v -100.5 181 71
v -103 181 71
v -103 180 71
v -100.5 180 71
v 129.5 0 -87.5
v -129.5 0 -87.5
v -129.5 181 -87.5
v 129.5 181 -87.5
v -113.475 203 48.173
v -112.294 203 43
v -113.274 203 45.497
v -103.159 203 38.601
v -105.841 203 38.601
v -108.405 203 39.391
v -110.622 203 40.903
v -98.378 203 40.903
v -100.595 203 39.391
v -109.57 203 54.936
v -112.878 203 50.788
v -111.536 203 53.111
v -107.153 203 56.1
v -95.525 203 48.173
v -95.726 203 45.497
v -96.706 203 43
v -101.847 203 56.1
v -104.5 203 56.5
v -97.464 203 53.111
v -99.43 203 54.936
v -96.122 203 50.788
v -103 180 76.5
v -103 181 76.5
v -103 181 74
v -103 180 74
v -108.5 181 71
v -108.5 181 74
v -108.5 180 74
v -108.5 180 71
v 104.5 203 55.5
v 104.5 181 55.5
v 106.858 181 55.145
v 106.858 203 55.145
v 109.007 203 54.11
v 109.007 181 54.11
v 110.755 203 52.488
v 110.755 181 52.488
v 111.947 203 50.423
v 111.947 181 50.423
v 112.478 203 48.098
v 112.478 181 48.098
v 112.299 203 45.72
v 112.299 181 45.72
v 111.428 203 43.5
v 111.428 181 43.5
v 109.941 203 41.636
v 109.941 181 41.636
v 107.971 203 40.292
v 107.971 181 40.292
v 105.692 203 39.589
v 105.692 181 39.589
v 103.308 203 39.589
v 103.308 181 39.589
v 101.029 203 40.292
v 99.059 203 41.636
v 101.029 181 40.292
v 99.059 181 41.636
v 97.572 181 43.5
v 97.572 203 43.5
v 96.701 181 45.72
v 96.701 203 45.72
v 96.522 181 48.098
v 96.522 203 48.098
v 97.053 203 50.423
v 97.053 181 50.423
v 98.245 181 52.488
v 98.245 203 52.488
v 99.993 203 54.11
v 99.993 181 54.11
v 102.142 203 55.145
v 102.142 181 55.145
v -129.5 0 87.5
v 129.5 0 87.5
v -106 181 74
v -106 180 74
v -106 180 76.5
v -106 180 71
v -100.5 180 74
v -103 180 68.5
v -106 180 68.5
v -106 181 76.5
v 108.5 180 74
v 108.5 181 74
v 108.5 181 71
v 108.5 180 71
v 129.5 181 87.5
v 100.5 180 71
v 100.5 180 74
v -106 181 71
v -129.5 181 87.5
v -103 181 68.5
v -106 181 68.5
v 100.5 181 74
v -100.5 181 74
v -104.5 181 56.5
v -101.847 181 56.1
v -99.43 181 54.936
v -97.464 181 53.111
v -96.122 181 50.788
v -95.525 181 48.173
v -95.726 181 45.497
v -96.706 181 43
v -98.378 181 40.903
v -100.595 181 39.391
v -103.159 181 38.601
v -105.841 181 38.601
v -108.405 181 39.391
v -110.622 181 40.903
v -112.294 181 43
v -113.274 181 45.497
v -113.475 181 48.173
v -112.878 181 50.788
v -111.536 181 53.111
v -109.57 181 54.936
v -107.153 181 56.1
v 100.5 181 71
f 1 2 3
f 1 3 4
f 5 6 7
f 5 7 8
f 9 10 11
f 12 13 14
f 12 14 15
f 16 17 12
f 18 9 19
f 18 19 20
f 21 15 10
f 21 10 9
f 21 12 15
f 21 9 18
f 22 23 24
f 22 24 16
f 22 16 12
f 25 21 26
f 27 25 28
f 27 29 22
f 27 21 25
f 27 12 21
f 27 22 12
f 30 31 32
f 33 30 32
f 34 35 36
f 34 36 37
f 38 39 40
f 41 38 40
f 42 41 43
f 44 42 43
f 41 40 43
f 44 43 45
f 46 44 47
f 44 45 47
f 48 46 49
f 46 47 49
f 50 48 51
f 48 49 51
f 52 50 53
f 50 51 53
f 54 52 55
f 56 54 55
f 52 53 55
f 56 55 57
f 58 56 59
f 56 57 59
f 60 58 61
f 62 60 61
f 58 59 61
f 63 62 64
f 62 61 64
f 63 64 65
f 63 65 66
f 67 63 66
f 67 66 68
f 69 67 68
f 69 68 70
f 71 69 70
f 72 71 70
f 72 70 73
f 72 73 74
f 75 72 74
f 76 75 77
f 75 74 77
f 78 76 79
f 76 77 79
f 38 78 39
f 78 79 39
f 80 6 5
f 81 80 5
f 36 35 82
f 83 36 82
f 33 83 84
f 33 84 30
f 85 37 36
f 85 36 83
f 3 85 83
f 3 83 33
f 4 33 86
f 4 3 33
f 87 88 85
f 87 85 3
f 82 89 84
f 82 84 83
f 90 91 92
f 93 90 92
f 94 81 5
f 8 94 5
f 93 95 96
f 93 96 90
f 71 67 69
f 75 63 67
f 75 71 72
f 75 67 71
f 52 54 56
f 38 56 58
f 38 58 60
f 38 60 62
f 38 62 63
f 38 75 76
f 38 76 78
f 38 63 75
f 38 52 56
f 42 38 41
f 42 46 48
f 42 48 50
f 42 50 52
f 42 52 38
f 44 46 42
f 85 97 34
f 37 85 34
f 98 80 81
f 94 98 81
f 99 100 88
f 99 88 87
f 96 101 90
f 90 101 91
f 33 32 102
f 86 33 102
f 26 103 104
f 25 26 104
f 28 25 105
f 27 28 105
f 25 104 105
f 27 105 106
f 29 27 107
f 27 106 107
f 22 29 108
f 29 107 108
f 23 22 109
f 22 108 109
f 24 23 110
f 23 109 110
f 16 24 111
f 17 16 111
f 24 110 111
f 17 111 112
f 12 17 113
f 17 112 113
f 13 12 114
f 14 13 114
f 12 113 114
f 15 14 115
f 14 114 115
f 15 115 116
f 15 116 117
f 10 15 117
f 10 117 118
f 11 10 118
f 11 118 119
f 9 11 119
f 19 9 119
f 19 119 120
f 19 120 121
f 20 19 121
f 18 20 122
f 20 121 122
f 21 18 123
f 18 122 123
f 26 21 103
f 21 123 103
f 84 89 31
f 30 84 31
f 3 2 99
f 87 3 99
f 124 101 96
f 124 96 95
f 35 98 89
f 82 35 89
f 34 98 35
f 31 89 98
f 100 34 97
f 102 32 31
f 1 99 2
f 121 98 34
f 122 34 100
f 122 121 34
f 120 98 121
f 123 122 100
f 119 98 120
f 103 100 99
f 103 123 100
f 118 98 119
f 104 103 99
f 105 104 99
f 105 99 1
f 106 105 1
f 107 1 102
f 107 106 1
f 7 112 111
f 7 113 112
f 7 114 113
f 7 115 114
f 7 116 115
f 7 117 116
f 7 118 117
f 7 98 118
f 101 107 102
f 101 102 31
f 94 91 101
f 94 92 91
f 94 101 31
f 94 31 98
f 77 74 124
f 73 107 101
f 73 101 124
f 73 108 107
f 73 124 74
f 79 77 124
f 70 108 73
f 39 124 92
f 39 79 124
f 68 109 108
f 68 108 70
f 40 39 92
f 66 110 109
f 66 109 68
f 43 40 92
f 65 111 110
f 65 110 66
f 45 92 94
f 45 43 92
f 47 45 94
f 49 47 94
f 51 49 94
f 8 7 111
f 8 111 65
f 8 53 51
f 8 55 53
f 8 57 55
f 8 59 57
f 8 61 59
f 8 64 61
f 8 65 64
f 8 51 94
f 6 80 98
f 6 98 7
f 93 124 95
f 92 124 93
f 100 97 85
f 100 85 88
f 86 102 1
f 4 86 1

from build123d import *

# Parameters (mm, degrees)
SKETCH1_W           = 259
SKETCH1_H           = 175
BOSS_EXTRUDE1_DEPTH = 181
SKETCH2_R           = 9
SKETCH2_R_2         = 8
BOSS_EXTRUDE2_DEPTH = 22
SKETCH3_W           = 2.5
SKETCH3_H           = 3
SKETCH3_W_2         = 3
SKETCH3_H_2         = 2.5
SKETCH3_W_3         = 8
CUT_EXTRUDE1_DEPTH  = 1


with BuildPart() as part:
    # Sketch1 → Boss-Extrude1 (new body)
    with BuildSketch(Plane(origin=(0, 0, 0), x_dir=(1, 0, 0), z_dir=(0, 1, 0))):
        Rectangle(SKETCH1_W, SKETCH1_H)
    extrude(amount=BOSS_EXTRUDE1_DEPTH)

    # Sketch2 → Boss-Extrude2 (add)
    with BuildSketch(Plane(origin=(0, 181, 0), x_dir=(1, 0, 0), z_dir=(0, 1, 0))):
        with Locations(Location((-104.5, -47.5, 0), (0, 0, 270))):
            Circle(SKETCH2_R)
        with Locations(Location((104.5, -47.5, 0), (0, 0, 270))):
            Circle(SKETCH2_R_2)
    extrude(amount=BOSS_EXTRUDE2_DEPTH)

    # Sketch3 → Cut-Extrude1 (cut)
    with BuildSketch(Plane(origin=(0, 181, 0), x_dir=(1, 0, 0), z_dir=(0, 1, 0))):
        with Locations((-107.25, -72.5)):
            Rectangle(SKETCH3_W, SKETCH3_H)
        with Locations((-104.5, -72.5)):
            Rectangle(SKETCH3_W_2, SKETCH3_H)
        with Locations((-104.5, -69.75)):
            Rectangle(SKETCH3_W_2, SKETCH3_H_2)
        with Locations((-101.75, -72.5)):
            Rectangle(SKETCH3_W, SKETCH3_H)
        with Locations((-104.5, -75.25)):
            Rectangle(SKETCH3_W_2, SKETCH3_H_2)
        with Locations((104.5, -72.5)):
            Rectangle(SKETCH3_W_3, SKETCH3_H)
    extrude(amount=-CUT_EXTRUDE1_DEPTH, mode=Mode.SUBTRACT)


solid = part.part
